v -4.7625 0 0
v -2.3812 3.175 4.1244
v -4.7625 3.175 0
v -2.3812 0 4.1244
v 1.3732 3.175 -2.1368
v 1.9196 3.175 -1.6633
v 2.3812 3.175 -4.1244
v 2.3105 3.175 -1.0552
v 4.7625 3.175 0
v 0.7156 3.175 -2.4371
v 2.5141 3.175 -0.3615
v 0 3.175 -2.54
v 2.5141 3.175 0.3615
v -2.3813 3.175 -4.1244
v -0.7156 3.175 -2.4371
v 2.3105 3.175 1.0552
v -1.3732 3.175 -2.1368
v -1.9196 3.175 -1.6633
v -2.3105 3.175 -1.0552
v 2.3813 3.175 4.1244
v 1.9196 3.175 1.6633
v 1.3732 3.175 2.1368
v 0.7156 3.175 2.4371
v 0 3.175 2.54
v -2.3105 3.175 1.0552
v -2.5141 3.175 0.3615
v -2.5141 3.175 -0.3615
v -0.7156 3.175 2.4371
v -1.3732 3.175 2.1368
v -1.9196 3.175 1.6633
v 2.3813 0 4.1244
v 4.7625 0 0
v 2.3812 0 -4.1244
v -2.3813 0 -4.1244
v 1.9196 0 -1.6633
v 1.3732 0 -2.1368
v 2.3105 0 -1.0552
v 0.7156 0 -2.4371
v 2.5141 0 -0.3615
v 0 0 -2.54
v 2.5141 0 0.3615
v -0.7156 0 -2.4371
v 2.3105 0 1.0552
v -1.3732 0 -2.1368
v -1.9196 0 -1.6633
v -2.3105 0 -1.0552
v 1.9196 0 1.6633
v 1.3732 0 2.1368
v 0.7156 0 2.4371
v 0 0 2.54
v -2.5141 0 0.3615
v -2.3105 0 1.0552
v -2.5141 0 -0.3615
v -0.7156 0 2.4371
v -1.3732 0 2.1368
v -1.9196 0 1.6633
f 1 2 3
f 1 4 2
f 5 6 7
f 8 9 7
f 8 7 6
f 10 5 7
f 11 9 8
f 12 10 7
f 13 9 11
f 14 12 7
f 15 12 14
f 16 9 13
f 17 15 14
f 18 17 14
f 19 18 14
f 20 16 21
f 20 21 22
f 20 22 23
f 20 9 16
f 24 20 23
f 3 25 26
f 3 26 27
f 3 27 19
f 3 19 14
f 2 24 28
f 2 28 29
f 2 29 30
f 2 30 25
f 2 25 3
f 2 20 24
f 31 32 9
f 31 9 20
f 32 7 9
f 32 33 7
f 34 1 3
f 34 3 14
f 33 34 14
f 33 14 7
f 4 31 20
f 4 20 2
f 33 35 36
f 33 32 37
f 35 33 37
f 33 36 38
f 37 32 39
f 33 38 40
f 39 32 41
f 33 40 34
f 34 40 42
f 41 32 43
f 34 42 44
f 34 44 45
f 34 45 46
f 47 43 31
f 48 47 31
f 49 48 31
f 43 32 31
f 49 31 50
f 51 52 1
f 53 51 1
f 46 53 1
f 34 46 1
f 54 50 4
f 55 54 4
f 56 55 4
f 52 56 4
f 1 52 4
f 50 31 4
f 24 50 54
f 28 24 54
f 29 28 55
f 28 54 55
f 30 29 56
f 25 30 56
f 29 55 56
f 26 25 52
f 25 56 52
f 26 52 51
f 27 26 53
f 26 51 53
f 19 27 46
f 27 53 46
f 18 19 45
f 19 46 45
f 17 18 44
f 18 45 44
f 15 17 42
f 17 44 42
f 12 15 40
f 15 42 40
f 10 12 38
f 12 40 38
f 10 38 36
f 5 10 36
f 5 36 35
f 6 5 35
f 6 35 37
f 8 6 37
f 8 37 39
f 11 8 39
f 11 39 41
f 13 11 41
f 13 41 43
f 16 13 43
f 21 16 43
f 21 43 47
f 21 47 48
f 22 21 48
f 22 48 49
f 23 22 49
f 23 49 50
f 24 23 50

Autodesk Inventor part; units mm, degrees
ref_plane "YZ Plane" through (0, 0, 0) normal (1, 0, 0) x (0, 1, 0)
ref_plane "XZ Plane" through (0, 0, 0) normal (0, 1, 0) x (-1, 0, 0)
ref_plane "XY Plane" through (0, 0, 0) normal (0, 0, 1) x (1, 0, 0)
sketch "Sketch1" plane through (0, 0, 0) normal (0, 1, 0) x (-1, 0, 0)
  line L0 (4.7625, 0) -> (2.3813, -4.1244)
  line L1 (2.3813, -4.1244) -> (-2.3812, -4.1244)
  line L2 (-2.3812, -4.1244) -> (-4.7625, 0)
  line L3 (-4.7625, 0) -> (-2.3813, 4.1244)
  line L4 (-2.3813, 4.1244) -> (2.3812, 4.1244)
  line L5 (2.3812, 4.1244) -> (4.7625, 0)
  point P0 (0, 0)
  point P1 (0, 0)
extrude "Extrusion1" add sketch "Sketch1" along normal blind 3.175
sketch "Sketch2" plane through (0, 3.175, 0) normal (0, 1, 0) x (1, 0, 0)
  circle A0 centre (0, 0) radius 2.54
  dimension "d3" = 5.08
hole "Hole1" at (0, 3.175, 0) direction (0, -1, 0) diameter 5.08 end through all
thread "Thread1" size "12-24 UNC" class "2B" standard "ANSI Unified Screw Threads" full length
properties part number "Nut"
